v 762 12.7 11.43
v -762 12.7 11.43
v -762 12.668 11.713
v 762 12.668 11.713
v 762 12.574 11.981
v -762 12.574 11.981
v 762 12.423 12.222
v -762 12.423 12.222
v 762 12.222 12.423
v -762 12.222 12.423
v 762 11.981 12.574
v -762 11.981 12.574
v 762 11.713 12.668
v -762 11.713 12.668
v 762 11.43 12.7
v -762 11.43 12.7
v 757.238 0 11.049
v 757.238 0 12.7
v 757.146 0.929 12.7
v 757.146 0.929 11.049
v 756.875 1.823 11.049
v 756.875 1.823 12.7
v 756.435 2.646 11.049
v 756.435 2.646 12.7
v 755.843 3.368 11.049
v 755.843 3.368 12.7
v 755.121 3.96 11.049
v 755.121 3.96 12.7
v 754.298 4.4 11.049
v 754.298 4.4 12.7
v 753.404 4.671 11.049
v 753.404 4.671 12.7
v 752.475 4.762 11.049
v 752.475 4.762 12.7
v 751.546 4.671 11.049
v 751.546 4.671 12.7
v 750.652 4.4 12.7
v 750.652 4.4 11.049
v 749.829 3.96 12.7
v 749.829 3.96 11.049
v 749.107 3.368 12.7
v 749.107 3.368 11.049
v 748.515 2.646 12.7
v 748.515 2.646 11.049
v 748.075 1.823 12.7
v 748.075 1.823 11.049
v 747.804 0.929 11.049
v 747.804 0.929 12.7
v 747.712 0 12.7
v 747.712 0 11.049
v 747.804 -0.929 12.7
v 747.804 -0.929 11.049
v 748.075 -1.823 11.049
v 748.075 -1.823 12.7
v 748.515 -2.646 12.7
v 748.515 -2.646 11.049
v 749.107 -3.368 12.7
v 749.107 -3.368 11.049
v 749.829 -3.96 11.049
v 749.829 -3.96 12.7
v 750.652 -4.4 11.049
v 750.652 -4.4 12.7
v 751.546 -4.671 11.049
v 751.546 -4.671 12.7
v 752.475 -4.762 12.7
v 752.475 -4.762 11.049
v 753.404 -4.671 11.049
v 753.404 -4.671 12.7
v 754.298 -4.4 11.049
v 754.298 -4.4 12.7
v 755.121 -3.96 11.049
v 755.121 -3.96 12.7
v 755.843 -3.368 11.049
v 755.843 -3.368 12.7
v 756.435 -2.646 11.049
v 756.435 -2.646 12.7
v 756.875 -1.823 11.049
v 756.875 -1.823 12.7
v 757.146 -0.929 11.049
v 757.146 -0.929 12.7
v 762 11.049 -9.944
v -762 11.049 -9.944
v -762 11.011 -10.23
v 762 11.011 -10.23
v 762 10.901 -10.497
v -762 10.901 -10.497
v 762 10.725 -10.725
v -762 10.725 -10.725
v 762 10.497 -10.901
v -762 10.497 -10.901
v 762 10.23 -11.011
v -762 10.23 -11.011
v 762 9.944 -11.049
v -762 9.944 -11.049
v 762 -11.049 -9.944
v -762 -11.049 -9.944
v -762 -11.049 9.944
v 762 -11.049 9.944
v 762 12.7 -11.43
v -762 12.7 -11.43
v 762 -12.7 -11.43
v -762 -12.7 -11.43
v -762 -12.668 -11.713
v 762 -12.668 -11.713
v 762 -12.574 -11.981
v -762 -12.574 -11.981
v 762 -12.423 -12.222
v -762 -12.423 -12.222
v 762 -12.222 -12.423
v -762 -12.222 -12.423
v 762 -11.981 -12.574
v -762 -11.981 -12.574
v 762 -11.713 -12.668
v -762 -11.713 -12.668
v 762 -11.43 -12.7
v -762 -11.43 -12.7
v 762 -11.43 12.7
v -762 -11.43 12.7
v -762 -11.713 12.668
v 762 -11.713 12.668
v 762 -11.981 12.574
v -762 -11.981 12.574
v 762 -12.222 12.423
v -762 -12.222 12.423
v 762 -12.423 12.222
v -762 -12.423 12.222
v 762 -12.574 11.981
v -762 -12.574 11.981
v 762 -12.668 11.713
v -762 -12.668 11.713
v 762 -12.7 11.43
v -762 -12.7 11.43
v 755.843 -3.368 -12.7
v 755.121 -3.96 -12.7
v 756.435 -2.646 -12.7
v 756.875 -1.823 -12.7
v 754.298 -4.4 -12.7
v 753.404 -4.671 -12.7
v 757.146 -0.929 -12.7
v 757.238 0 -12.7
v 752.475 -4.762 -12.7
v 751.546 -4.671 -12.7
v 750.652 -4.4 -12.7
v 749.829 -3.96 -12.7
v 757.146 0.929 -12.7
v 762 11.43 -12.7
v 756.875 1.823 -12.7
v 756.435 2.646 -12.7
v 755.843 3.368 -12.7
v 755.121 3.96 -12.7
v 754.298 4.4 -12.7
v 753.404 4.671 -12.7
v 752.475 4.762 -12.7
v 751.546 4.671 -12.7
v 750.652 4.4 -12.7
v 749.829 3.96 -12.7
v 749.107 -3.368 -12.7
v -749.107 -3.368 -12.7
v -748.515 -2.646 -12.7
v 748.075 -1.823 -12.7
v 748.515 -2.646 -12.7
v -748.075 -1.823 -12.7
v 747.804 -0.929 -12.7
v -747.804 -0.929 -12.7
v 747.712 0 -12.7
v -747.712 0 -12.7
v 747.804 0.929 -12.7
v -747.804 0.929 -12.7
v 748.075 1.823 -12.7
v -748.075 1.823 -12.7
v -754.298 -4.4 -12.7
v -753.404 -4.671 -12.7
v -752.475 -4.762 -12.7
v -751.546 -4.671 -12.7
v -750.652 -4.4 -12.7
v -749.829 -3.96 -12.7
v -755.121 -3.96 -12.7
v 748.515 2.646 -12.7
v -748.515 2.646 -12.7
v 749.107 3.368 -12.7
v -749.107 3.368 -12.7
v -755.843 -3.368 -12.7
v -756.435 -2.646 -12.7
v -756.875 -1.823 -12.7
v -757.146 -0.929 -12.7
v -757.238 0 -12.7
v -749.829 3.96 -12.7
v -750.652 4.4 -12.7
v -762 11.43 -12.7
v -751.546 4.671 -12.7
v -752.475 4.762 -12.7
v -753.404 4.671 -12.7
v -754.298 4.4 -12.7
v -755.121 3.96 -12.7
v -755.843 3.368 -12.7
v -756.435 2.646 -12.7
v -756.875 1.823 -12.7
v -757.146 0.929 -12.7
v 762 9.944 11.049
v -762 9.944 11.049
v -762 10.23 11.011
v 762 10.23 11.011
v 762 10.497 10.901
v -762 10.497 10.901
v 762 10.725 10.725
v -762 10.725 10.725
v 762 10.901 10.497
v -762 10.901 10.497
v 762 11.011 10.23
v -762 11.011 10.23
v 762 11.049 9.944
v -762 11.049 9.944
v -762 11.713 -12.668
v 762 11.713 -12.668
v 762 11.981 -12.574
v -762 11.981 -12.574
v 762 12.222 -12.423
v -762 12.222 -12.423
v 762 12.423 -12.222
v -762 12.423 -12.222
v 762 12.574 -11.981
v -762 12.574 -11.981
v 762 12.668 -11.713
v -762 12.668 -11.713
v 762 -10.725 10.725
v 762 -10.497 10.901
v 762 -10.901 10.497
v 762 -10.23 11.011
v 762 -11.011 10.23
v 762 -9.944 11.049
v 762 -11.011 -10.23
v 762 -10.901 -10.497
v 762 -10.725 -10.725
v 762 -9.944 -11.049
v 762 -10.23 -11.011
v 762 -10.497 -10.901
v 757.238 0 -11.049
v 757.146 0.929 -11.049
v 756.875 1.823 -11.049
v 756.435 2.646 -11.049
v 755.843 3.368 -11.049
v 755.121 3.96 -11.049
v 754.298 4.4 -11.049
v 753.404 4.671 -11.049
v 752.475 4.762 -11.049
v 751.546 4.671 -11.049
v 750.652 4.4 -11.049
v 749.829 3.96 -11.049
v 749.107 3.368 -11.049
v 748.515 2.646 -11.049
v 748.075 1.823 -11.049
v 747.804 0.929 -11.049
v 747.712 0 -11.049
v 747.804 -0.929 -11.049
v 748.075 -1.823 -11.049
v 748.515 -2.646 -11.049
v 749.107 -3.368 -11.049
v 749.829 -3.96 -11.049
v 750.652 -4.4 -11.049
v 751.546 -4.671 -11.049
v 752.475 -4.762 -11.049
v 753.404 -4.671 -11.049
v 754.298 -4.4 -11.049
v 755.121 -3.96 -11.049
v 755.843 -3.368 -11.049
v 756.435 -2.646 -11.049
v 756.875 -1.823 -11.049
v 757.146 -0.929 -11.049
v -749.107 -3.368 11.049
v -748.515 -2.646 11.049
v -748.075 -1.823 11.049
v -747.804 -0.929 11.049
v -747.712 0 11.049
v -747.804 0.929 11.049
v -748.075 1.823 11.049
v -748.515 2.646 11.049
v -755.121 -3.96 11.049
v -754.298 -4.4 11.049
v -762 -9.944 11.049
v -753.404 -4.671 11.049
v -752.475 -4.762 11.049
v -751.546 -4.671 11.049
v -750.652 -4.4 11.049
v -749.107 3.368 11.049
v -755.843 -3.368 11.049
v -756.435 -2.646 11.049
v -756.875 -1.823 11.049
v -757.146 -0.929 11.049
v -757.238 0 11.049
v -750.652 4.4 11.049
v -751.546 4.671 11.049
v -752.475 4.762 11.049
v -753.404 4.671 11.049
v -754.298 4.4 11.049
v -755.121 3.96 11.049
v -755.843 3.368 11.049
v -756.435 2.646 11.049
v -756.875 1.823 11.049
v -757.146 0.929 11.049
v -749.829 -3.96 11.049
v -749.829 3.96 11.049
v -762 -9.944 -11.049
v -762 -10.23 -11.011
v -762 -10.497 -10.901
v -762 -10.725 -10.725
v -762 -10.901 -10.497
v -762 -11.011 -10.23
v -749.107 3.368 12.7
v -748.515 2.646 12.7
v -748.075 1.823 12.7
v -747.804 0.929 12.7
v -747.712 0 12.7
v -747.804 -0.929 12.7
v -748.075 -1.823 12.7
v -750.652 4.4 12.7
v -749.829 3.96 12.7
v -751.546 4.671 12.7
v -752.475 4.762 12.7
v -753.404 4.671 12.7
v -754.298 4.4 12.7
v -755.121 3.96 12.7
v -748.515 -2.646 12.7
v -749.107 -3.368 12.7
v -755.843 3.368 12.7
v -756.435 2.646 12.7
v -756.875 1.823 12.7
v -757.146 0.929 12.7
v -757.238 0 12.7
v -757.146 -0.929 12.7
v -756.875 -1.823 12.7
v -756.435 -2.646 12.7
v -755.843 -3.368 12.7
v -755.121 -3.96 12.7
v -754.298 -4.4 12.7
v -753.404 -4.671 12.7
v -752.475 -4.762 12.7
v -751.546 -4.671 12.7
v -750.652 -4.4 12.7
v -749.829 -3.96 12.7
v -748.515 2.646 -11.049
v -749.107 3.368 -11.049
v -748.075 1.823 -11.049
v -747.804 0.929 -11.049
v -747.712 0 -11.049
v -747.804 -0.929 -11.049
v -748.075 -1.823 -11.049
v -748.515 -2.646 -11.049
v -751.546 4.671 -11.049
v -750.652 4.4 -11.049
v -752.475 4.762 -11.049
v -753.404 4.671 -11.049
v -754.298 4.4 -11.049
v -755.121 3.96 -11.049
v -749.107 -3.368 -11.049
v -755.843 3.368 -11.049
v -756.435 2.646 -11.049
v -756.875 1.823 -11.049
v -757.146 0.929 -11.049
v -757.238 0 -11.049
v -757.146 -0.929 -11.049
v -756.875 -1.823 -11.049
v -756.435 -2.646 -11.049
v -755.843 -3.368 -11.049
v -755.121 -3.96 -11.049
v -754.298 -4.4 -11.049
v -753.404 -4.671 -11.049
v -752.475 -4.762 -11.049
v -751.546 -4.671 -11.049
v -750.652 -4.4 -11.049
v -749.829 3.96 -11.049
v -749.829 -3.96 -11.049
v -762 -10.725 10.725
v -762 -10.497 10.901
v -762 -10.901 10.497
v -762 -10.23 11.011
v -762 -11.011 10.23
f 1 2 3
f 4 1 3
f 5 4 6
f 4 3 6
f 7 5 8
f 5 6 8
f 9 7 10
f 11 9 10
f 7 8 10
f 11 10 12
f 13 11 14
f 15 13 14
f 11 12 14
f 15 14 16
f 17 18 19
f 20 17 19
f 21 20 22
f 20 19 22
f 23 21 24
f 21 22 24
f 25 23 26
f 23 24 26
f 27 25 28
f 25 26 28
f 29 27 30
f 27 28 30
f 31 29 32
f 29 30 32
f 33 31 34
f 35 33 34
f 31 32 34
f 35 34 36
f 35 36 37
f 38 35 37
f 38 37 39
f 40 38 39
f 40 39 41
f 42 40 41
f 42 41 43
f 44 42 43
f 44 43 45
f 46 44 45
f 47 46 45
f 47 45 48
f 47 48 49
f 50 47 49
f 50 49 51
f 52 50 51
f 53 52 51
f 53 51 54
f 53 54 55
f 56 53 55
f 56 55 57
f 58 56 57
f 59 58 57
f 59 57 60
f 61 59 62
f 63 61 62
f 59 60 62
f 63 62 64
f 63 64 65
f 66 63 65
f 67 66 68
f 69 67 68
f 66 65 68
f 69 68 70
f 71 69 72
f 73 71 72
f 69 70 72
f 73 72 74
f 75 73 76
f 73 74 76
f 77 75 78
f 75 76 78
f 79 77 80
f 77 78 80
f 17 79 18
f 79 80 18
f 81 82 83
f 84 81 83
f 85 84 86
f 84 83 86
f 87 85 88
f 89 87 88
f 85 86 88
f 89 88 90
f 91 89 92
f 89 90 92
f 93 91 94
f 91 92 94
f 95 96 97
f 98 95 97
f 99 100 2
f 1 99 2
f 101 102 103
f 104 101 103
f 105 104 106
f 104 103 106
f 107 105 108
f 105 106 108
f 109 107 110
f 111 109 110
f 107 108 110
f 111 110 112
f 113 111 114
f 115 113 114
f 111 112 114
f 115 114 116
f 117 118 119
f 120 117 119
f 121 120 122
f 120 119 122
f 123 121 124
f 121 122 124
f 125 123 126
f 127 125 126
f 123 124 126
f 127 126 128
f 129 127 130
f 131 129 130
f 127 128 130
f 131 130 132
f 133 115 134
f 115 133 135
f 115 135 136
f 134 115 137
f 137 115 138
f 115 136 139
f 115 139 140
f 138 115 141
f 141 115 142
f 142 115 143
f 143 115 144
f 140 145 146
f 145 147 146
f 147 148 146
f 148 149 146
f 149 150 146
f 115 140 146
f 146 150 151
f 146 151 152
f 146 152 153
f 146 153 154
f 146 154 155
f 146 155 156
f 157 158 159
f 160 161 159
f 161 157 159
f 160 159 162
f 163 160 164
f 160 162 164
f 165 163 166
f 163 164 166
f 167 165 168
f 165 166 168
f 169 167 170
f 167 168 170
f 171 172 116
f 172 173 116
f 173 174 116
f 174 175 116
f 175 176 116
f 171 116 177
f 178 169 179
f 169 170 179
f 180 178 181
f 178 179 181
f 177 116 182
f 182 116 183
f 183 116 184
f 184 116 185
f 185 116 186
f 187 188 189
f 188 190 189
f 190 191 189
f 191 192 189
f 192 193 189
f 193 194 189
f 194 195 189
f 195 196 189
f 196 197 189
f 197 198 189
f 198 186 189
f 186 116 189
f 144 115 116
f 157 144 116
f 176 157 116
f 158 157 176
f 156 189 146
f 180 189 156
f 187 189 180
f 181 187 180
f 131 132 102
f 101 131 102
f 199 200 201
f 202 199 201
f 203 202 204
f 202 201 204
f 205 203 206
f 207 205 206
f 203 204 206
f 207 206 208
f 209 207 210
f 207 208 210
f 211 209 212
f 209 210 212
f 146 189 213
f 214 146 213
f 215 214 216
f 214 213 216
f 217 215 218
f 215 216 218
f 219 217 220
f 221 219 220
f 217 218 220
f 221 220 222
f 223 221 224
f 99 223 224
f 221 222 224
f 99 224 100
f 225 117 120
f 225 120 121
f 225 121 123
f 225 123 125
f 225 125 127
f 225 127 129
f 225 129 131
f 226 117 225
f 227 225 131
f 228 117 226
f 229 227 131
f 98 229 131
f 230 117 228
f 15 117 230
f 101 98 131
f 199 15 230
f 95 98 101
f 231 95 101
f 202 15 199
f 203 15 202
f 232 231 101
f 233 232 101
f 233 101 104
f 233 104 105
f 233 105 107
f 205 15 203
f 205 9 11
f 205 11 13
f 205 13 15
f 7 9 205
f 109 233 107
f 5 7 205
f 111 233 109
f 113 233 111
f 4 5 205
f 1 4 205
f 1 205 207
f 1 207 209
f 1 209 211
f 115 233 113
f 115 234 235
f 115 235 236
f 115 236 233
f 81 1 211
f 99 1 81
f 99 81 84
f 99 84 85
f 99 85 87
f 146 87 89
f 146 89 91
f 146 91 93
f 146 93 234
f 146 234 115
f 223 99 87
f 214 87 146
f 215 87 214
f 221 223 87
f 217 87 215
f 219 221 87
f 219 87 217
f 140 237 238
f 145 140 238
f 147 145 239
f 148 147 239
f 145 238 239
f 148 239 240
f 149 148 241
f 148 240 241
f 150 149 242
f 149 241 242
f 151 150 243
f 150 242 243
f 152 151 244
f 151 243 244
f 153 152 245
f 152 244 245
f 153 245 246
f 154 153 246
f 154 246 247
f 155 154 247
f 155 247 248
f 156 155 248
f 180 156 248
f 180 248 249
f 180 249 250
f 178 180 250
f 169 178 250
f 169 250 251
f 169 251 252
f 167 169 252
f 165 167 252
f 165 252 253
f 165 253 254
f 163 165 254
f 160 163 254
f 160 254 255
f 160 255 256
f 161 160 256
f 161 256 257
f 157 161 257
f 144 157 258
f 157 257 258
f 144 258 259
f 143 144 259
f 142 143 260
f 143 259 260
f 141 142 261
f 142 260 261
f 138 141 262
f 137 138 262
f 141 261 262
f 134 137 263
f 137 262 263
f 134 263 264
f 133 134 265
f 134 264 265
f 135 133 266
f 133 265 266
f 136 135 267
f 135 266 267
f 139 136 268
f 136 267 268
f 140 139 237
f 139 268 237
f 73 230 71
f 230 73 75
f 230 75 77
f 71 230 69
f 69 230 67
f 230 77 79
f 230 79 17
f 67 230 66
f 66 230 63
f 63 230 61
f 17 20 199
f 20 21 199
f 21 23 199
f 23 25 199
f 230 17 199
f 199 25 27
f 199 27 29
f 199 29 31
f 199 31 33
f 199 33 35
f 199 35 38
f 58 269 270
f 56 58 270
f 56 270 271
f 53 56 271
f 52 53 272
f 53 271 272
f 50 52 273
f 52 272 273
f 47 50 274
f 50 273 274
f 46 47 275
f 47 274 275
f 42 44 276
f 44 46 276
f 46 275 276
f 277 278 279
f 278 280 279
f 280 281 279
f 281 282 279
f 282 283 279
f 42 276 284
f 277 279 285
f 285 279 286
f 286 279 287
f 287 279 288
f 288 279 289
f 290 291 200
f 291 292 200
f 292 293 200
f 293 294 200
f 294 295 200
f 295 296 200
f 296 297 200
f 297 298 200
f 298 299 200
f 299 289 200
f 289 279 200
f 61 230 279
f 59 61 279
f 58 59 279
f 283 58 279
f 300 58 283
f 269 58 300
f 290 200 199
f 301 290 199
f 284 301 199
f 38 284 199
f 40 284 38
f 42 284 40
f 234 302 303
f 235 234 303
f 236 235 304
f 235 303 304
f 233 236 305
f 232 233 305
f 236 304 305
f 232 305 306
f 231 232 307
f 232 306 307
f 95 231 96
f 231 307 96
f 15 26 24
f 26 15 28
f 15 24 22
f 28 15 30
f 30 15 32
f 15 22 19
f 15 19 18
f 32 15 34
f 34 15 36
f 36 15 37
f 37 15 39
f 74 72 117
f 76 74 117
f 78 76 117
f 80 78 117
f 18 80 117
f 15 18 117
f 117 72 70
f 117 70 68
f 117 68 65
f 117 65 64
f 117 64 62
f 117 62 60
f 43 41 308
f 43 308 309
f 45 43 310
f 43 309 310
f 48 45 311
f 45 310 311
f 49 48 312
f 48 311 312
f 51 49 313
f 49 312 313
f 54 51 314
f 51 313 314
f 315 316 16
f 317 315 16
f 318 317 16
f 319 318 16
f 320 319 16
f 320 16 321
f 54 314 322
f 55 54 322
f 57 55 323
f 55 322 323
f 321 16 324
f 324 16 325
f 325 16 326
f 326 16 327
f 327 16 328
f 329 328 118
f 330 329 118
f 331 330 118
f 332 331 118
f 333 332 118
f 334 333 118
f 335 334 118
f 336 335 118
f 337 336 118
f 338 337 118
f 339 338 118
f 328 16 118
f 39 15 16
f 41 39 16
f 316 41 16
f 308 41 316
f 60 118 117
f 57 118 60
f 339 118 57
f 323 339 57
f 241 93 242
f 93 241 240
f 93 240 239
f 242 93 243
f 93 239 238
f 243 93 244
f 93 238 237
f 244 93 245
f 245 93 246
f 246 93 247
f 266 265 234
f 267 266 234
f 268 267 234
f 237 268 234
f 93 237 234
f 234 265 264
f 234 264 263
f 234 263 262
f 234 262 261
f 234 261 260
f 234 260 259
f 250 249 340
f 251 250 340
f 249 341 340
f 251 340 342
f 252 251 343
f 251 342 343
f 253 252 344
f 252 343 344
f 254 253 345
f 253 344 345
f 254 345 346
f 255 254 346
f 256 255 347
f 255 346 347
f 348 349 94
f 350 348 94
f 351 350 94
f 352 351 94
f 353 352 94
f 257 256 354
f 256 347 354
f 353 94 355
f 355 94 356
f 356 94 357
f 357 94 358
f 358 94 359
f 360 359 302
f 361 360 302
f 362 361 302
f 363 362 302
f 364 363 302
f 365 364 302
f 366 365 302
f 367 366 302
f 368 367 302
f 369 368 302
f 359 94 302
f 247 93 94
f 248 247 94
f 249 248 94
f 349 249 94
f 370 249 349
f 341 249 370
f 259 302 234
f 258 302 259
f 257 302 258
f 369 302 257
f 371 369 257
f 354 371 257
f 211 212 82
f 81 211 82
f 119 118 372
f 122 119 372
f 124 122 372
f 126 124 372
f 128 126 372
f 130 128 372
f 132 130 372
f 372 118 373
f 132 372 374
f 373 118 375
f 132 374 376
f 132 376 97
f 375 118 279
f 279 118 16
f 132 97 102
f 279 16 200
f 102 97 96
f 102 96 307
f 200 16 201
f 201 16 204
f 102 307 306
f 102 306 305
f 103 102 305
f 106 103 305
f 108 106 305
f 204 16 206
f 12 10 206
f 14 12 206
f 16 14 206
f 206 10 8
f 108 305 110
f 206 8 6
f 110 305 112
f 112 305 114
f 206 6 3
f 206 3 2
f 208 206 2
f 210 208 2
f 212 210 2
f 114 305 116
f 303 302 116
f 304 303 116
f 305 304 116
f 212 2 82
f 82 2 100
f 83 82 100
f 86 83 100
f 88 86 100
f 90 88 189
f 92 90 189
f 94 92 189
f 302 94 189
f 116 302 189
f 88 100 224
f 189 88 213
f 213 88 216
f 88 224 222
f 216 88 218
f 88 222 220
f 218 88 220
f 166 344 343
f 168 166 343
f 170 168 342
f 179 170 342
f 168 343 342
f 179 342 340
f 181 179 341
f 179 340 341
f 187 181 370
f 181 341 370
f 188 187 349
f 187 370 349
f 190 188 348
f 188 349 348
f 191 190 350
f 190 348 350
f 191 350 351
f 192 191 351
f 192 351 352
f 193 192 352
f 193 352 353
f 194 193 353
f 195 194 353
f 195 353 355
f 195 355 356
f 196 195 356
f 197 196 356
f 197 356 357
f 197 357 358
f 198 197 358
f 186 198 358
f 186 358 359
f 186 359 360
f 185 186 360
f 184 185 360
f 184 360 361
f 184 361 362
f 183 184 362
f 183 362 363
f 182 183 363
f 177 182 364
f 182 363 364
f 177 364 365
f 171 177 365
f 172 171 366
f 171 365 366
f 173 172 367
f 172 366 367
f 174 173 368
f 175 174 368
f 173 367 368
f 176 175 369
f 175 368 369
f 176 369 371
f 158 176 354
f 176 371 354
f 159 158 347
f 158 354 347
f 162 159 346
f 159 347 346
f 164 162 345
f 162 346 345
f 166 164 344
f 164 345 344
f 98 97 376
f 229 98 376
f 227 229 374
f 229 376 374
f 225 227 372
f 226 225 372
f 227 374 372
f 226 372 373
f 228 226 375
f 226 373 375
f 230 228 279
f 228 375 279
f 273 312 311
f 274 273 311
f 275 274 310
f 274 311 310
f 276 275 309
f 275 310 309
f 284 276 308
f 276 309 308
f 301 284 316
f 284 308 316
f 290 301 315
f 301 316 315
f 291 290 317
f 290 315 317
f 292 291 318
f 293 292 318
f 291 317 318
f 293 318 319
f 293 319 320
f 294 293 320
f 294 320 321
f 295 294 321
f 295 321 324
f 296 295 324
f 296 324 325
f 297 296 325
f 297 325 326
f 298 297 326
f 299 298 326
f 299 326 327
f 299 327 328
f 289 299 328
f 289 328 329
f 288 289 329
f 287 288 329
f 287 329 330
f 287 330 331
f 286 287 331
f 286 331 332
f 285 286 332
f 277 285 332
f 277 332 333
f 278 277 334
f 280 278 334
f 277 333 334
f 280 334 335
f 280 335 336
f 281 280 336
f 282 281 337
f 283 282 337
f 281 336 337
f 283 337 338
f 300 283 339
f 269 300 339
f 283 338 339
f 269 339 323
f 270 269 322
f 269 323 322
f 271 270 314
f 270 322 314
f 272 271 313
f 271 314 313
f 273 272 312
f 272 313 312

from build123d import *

# Parameters (mm, degrees)
BOSS_EXTRUDE1_DEPTH      = 762
BOSS_EXTRUDE1_DEPTH_BACK = 762
SKETCH6_R                = 4.7625
CUT_EXTRUDE1_DEPTH       = 763.528983056


with BuildPart() as part:
    # Sketch4 → Boss-Extrude1 (new, two sides: drawn at the far end of the back side and taken through both)
    with BuildSketch(Plane(origin=(0, 0, 0), x_dir=(0, 0, -1), z_dir=(1, 0, 0)).offset(-BOSS_EXTRUDE1_DEPTH_BACK)):
        with BuildLine():
            Line((12.7, -11.43), (12.7, 11.43))
            ThreePointArc((12.7, 11.43), (12.328025612, 12.328025612), (11.43, 12.7))
            Line((11.43, 12.7), (-11.43, 12.7))
            ThreePointArc((-11.43, 12.7), (-12.328025612, 12.328025612), (-12.7, 11.43))
            Line((-12.7, 11.43), (-12.7, -11.43))
            ThreePointArc((-12.7, -11.43), (-12.328025612, -12.328025612), (-11.43, -12.7))
            Line((-11.43, -12.7), (11.43, -12.7))
            ThreePointArc((11.43, -12.7), (12.328025612, -12.328025612), (12.7, -11.43))
        make_face()
        with BuildLine():
            Line((11.049, 9.9441), (11.049, -9.9441))
            ThreePointArc((11.049, -9.9441), (10.725382283, -10.725382283), (9.9441, -11.049))
            Line((9.9441, -11.049), (-9.9441, -11.049))
            ThreePointArc((-9.9441, -11.049), (-10.725382283, -10.725382283), (-11.049, -9.9441))
            Line((-11.049, -9.9441), (-11.049, 9.9441))
            ThreePointArc((-11.049, 9.9441), (-10.725382283, 10.725382283), (-9.9441, 11.049))
            Line((-9.9441, 11.049), (9.9441, 11.049))
            ThreePointArc((9.9441, 11.049), (10.725382283, 10.725382283), (11.049, 9.9441))
        make_face(mode=Mode.SUBTRACT)
    extrude(amount=BOSS_EXTRUDE1_DEPTH + BOSS_EXTRUDE1_DEPTH_BACK)

    # Sketch6 → Cut-Extrude1 (cut, through all)
    with BuildSketch(Plane.XY.offset(12.7)):
        with Locations((752.475, 0)):
            Circle(SKETCH6_R)
        with Locations((-752.475, 0)):
            Circle(SKETCH6_R)
    extrude(amount=-CUT_EXTRUDE1_DEPTH, mode=Mode.SUBTRACT)


solid = part.part
